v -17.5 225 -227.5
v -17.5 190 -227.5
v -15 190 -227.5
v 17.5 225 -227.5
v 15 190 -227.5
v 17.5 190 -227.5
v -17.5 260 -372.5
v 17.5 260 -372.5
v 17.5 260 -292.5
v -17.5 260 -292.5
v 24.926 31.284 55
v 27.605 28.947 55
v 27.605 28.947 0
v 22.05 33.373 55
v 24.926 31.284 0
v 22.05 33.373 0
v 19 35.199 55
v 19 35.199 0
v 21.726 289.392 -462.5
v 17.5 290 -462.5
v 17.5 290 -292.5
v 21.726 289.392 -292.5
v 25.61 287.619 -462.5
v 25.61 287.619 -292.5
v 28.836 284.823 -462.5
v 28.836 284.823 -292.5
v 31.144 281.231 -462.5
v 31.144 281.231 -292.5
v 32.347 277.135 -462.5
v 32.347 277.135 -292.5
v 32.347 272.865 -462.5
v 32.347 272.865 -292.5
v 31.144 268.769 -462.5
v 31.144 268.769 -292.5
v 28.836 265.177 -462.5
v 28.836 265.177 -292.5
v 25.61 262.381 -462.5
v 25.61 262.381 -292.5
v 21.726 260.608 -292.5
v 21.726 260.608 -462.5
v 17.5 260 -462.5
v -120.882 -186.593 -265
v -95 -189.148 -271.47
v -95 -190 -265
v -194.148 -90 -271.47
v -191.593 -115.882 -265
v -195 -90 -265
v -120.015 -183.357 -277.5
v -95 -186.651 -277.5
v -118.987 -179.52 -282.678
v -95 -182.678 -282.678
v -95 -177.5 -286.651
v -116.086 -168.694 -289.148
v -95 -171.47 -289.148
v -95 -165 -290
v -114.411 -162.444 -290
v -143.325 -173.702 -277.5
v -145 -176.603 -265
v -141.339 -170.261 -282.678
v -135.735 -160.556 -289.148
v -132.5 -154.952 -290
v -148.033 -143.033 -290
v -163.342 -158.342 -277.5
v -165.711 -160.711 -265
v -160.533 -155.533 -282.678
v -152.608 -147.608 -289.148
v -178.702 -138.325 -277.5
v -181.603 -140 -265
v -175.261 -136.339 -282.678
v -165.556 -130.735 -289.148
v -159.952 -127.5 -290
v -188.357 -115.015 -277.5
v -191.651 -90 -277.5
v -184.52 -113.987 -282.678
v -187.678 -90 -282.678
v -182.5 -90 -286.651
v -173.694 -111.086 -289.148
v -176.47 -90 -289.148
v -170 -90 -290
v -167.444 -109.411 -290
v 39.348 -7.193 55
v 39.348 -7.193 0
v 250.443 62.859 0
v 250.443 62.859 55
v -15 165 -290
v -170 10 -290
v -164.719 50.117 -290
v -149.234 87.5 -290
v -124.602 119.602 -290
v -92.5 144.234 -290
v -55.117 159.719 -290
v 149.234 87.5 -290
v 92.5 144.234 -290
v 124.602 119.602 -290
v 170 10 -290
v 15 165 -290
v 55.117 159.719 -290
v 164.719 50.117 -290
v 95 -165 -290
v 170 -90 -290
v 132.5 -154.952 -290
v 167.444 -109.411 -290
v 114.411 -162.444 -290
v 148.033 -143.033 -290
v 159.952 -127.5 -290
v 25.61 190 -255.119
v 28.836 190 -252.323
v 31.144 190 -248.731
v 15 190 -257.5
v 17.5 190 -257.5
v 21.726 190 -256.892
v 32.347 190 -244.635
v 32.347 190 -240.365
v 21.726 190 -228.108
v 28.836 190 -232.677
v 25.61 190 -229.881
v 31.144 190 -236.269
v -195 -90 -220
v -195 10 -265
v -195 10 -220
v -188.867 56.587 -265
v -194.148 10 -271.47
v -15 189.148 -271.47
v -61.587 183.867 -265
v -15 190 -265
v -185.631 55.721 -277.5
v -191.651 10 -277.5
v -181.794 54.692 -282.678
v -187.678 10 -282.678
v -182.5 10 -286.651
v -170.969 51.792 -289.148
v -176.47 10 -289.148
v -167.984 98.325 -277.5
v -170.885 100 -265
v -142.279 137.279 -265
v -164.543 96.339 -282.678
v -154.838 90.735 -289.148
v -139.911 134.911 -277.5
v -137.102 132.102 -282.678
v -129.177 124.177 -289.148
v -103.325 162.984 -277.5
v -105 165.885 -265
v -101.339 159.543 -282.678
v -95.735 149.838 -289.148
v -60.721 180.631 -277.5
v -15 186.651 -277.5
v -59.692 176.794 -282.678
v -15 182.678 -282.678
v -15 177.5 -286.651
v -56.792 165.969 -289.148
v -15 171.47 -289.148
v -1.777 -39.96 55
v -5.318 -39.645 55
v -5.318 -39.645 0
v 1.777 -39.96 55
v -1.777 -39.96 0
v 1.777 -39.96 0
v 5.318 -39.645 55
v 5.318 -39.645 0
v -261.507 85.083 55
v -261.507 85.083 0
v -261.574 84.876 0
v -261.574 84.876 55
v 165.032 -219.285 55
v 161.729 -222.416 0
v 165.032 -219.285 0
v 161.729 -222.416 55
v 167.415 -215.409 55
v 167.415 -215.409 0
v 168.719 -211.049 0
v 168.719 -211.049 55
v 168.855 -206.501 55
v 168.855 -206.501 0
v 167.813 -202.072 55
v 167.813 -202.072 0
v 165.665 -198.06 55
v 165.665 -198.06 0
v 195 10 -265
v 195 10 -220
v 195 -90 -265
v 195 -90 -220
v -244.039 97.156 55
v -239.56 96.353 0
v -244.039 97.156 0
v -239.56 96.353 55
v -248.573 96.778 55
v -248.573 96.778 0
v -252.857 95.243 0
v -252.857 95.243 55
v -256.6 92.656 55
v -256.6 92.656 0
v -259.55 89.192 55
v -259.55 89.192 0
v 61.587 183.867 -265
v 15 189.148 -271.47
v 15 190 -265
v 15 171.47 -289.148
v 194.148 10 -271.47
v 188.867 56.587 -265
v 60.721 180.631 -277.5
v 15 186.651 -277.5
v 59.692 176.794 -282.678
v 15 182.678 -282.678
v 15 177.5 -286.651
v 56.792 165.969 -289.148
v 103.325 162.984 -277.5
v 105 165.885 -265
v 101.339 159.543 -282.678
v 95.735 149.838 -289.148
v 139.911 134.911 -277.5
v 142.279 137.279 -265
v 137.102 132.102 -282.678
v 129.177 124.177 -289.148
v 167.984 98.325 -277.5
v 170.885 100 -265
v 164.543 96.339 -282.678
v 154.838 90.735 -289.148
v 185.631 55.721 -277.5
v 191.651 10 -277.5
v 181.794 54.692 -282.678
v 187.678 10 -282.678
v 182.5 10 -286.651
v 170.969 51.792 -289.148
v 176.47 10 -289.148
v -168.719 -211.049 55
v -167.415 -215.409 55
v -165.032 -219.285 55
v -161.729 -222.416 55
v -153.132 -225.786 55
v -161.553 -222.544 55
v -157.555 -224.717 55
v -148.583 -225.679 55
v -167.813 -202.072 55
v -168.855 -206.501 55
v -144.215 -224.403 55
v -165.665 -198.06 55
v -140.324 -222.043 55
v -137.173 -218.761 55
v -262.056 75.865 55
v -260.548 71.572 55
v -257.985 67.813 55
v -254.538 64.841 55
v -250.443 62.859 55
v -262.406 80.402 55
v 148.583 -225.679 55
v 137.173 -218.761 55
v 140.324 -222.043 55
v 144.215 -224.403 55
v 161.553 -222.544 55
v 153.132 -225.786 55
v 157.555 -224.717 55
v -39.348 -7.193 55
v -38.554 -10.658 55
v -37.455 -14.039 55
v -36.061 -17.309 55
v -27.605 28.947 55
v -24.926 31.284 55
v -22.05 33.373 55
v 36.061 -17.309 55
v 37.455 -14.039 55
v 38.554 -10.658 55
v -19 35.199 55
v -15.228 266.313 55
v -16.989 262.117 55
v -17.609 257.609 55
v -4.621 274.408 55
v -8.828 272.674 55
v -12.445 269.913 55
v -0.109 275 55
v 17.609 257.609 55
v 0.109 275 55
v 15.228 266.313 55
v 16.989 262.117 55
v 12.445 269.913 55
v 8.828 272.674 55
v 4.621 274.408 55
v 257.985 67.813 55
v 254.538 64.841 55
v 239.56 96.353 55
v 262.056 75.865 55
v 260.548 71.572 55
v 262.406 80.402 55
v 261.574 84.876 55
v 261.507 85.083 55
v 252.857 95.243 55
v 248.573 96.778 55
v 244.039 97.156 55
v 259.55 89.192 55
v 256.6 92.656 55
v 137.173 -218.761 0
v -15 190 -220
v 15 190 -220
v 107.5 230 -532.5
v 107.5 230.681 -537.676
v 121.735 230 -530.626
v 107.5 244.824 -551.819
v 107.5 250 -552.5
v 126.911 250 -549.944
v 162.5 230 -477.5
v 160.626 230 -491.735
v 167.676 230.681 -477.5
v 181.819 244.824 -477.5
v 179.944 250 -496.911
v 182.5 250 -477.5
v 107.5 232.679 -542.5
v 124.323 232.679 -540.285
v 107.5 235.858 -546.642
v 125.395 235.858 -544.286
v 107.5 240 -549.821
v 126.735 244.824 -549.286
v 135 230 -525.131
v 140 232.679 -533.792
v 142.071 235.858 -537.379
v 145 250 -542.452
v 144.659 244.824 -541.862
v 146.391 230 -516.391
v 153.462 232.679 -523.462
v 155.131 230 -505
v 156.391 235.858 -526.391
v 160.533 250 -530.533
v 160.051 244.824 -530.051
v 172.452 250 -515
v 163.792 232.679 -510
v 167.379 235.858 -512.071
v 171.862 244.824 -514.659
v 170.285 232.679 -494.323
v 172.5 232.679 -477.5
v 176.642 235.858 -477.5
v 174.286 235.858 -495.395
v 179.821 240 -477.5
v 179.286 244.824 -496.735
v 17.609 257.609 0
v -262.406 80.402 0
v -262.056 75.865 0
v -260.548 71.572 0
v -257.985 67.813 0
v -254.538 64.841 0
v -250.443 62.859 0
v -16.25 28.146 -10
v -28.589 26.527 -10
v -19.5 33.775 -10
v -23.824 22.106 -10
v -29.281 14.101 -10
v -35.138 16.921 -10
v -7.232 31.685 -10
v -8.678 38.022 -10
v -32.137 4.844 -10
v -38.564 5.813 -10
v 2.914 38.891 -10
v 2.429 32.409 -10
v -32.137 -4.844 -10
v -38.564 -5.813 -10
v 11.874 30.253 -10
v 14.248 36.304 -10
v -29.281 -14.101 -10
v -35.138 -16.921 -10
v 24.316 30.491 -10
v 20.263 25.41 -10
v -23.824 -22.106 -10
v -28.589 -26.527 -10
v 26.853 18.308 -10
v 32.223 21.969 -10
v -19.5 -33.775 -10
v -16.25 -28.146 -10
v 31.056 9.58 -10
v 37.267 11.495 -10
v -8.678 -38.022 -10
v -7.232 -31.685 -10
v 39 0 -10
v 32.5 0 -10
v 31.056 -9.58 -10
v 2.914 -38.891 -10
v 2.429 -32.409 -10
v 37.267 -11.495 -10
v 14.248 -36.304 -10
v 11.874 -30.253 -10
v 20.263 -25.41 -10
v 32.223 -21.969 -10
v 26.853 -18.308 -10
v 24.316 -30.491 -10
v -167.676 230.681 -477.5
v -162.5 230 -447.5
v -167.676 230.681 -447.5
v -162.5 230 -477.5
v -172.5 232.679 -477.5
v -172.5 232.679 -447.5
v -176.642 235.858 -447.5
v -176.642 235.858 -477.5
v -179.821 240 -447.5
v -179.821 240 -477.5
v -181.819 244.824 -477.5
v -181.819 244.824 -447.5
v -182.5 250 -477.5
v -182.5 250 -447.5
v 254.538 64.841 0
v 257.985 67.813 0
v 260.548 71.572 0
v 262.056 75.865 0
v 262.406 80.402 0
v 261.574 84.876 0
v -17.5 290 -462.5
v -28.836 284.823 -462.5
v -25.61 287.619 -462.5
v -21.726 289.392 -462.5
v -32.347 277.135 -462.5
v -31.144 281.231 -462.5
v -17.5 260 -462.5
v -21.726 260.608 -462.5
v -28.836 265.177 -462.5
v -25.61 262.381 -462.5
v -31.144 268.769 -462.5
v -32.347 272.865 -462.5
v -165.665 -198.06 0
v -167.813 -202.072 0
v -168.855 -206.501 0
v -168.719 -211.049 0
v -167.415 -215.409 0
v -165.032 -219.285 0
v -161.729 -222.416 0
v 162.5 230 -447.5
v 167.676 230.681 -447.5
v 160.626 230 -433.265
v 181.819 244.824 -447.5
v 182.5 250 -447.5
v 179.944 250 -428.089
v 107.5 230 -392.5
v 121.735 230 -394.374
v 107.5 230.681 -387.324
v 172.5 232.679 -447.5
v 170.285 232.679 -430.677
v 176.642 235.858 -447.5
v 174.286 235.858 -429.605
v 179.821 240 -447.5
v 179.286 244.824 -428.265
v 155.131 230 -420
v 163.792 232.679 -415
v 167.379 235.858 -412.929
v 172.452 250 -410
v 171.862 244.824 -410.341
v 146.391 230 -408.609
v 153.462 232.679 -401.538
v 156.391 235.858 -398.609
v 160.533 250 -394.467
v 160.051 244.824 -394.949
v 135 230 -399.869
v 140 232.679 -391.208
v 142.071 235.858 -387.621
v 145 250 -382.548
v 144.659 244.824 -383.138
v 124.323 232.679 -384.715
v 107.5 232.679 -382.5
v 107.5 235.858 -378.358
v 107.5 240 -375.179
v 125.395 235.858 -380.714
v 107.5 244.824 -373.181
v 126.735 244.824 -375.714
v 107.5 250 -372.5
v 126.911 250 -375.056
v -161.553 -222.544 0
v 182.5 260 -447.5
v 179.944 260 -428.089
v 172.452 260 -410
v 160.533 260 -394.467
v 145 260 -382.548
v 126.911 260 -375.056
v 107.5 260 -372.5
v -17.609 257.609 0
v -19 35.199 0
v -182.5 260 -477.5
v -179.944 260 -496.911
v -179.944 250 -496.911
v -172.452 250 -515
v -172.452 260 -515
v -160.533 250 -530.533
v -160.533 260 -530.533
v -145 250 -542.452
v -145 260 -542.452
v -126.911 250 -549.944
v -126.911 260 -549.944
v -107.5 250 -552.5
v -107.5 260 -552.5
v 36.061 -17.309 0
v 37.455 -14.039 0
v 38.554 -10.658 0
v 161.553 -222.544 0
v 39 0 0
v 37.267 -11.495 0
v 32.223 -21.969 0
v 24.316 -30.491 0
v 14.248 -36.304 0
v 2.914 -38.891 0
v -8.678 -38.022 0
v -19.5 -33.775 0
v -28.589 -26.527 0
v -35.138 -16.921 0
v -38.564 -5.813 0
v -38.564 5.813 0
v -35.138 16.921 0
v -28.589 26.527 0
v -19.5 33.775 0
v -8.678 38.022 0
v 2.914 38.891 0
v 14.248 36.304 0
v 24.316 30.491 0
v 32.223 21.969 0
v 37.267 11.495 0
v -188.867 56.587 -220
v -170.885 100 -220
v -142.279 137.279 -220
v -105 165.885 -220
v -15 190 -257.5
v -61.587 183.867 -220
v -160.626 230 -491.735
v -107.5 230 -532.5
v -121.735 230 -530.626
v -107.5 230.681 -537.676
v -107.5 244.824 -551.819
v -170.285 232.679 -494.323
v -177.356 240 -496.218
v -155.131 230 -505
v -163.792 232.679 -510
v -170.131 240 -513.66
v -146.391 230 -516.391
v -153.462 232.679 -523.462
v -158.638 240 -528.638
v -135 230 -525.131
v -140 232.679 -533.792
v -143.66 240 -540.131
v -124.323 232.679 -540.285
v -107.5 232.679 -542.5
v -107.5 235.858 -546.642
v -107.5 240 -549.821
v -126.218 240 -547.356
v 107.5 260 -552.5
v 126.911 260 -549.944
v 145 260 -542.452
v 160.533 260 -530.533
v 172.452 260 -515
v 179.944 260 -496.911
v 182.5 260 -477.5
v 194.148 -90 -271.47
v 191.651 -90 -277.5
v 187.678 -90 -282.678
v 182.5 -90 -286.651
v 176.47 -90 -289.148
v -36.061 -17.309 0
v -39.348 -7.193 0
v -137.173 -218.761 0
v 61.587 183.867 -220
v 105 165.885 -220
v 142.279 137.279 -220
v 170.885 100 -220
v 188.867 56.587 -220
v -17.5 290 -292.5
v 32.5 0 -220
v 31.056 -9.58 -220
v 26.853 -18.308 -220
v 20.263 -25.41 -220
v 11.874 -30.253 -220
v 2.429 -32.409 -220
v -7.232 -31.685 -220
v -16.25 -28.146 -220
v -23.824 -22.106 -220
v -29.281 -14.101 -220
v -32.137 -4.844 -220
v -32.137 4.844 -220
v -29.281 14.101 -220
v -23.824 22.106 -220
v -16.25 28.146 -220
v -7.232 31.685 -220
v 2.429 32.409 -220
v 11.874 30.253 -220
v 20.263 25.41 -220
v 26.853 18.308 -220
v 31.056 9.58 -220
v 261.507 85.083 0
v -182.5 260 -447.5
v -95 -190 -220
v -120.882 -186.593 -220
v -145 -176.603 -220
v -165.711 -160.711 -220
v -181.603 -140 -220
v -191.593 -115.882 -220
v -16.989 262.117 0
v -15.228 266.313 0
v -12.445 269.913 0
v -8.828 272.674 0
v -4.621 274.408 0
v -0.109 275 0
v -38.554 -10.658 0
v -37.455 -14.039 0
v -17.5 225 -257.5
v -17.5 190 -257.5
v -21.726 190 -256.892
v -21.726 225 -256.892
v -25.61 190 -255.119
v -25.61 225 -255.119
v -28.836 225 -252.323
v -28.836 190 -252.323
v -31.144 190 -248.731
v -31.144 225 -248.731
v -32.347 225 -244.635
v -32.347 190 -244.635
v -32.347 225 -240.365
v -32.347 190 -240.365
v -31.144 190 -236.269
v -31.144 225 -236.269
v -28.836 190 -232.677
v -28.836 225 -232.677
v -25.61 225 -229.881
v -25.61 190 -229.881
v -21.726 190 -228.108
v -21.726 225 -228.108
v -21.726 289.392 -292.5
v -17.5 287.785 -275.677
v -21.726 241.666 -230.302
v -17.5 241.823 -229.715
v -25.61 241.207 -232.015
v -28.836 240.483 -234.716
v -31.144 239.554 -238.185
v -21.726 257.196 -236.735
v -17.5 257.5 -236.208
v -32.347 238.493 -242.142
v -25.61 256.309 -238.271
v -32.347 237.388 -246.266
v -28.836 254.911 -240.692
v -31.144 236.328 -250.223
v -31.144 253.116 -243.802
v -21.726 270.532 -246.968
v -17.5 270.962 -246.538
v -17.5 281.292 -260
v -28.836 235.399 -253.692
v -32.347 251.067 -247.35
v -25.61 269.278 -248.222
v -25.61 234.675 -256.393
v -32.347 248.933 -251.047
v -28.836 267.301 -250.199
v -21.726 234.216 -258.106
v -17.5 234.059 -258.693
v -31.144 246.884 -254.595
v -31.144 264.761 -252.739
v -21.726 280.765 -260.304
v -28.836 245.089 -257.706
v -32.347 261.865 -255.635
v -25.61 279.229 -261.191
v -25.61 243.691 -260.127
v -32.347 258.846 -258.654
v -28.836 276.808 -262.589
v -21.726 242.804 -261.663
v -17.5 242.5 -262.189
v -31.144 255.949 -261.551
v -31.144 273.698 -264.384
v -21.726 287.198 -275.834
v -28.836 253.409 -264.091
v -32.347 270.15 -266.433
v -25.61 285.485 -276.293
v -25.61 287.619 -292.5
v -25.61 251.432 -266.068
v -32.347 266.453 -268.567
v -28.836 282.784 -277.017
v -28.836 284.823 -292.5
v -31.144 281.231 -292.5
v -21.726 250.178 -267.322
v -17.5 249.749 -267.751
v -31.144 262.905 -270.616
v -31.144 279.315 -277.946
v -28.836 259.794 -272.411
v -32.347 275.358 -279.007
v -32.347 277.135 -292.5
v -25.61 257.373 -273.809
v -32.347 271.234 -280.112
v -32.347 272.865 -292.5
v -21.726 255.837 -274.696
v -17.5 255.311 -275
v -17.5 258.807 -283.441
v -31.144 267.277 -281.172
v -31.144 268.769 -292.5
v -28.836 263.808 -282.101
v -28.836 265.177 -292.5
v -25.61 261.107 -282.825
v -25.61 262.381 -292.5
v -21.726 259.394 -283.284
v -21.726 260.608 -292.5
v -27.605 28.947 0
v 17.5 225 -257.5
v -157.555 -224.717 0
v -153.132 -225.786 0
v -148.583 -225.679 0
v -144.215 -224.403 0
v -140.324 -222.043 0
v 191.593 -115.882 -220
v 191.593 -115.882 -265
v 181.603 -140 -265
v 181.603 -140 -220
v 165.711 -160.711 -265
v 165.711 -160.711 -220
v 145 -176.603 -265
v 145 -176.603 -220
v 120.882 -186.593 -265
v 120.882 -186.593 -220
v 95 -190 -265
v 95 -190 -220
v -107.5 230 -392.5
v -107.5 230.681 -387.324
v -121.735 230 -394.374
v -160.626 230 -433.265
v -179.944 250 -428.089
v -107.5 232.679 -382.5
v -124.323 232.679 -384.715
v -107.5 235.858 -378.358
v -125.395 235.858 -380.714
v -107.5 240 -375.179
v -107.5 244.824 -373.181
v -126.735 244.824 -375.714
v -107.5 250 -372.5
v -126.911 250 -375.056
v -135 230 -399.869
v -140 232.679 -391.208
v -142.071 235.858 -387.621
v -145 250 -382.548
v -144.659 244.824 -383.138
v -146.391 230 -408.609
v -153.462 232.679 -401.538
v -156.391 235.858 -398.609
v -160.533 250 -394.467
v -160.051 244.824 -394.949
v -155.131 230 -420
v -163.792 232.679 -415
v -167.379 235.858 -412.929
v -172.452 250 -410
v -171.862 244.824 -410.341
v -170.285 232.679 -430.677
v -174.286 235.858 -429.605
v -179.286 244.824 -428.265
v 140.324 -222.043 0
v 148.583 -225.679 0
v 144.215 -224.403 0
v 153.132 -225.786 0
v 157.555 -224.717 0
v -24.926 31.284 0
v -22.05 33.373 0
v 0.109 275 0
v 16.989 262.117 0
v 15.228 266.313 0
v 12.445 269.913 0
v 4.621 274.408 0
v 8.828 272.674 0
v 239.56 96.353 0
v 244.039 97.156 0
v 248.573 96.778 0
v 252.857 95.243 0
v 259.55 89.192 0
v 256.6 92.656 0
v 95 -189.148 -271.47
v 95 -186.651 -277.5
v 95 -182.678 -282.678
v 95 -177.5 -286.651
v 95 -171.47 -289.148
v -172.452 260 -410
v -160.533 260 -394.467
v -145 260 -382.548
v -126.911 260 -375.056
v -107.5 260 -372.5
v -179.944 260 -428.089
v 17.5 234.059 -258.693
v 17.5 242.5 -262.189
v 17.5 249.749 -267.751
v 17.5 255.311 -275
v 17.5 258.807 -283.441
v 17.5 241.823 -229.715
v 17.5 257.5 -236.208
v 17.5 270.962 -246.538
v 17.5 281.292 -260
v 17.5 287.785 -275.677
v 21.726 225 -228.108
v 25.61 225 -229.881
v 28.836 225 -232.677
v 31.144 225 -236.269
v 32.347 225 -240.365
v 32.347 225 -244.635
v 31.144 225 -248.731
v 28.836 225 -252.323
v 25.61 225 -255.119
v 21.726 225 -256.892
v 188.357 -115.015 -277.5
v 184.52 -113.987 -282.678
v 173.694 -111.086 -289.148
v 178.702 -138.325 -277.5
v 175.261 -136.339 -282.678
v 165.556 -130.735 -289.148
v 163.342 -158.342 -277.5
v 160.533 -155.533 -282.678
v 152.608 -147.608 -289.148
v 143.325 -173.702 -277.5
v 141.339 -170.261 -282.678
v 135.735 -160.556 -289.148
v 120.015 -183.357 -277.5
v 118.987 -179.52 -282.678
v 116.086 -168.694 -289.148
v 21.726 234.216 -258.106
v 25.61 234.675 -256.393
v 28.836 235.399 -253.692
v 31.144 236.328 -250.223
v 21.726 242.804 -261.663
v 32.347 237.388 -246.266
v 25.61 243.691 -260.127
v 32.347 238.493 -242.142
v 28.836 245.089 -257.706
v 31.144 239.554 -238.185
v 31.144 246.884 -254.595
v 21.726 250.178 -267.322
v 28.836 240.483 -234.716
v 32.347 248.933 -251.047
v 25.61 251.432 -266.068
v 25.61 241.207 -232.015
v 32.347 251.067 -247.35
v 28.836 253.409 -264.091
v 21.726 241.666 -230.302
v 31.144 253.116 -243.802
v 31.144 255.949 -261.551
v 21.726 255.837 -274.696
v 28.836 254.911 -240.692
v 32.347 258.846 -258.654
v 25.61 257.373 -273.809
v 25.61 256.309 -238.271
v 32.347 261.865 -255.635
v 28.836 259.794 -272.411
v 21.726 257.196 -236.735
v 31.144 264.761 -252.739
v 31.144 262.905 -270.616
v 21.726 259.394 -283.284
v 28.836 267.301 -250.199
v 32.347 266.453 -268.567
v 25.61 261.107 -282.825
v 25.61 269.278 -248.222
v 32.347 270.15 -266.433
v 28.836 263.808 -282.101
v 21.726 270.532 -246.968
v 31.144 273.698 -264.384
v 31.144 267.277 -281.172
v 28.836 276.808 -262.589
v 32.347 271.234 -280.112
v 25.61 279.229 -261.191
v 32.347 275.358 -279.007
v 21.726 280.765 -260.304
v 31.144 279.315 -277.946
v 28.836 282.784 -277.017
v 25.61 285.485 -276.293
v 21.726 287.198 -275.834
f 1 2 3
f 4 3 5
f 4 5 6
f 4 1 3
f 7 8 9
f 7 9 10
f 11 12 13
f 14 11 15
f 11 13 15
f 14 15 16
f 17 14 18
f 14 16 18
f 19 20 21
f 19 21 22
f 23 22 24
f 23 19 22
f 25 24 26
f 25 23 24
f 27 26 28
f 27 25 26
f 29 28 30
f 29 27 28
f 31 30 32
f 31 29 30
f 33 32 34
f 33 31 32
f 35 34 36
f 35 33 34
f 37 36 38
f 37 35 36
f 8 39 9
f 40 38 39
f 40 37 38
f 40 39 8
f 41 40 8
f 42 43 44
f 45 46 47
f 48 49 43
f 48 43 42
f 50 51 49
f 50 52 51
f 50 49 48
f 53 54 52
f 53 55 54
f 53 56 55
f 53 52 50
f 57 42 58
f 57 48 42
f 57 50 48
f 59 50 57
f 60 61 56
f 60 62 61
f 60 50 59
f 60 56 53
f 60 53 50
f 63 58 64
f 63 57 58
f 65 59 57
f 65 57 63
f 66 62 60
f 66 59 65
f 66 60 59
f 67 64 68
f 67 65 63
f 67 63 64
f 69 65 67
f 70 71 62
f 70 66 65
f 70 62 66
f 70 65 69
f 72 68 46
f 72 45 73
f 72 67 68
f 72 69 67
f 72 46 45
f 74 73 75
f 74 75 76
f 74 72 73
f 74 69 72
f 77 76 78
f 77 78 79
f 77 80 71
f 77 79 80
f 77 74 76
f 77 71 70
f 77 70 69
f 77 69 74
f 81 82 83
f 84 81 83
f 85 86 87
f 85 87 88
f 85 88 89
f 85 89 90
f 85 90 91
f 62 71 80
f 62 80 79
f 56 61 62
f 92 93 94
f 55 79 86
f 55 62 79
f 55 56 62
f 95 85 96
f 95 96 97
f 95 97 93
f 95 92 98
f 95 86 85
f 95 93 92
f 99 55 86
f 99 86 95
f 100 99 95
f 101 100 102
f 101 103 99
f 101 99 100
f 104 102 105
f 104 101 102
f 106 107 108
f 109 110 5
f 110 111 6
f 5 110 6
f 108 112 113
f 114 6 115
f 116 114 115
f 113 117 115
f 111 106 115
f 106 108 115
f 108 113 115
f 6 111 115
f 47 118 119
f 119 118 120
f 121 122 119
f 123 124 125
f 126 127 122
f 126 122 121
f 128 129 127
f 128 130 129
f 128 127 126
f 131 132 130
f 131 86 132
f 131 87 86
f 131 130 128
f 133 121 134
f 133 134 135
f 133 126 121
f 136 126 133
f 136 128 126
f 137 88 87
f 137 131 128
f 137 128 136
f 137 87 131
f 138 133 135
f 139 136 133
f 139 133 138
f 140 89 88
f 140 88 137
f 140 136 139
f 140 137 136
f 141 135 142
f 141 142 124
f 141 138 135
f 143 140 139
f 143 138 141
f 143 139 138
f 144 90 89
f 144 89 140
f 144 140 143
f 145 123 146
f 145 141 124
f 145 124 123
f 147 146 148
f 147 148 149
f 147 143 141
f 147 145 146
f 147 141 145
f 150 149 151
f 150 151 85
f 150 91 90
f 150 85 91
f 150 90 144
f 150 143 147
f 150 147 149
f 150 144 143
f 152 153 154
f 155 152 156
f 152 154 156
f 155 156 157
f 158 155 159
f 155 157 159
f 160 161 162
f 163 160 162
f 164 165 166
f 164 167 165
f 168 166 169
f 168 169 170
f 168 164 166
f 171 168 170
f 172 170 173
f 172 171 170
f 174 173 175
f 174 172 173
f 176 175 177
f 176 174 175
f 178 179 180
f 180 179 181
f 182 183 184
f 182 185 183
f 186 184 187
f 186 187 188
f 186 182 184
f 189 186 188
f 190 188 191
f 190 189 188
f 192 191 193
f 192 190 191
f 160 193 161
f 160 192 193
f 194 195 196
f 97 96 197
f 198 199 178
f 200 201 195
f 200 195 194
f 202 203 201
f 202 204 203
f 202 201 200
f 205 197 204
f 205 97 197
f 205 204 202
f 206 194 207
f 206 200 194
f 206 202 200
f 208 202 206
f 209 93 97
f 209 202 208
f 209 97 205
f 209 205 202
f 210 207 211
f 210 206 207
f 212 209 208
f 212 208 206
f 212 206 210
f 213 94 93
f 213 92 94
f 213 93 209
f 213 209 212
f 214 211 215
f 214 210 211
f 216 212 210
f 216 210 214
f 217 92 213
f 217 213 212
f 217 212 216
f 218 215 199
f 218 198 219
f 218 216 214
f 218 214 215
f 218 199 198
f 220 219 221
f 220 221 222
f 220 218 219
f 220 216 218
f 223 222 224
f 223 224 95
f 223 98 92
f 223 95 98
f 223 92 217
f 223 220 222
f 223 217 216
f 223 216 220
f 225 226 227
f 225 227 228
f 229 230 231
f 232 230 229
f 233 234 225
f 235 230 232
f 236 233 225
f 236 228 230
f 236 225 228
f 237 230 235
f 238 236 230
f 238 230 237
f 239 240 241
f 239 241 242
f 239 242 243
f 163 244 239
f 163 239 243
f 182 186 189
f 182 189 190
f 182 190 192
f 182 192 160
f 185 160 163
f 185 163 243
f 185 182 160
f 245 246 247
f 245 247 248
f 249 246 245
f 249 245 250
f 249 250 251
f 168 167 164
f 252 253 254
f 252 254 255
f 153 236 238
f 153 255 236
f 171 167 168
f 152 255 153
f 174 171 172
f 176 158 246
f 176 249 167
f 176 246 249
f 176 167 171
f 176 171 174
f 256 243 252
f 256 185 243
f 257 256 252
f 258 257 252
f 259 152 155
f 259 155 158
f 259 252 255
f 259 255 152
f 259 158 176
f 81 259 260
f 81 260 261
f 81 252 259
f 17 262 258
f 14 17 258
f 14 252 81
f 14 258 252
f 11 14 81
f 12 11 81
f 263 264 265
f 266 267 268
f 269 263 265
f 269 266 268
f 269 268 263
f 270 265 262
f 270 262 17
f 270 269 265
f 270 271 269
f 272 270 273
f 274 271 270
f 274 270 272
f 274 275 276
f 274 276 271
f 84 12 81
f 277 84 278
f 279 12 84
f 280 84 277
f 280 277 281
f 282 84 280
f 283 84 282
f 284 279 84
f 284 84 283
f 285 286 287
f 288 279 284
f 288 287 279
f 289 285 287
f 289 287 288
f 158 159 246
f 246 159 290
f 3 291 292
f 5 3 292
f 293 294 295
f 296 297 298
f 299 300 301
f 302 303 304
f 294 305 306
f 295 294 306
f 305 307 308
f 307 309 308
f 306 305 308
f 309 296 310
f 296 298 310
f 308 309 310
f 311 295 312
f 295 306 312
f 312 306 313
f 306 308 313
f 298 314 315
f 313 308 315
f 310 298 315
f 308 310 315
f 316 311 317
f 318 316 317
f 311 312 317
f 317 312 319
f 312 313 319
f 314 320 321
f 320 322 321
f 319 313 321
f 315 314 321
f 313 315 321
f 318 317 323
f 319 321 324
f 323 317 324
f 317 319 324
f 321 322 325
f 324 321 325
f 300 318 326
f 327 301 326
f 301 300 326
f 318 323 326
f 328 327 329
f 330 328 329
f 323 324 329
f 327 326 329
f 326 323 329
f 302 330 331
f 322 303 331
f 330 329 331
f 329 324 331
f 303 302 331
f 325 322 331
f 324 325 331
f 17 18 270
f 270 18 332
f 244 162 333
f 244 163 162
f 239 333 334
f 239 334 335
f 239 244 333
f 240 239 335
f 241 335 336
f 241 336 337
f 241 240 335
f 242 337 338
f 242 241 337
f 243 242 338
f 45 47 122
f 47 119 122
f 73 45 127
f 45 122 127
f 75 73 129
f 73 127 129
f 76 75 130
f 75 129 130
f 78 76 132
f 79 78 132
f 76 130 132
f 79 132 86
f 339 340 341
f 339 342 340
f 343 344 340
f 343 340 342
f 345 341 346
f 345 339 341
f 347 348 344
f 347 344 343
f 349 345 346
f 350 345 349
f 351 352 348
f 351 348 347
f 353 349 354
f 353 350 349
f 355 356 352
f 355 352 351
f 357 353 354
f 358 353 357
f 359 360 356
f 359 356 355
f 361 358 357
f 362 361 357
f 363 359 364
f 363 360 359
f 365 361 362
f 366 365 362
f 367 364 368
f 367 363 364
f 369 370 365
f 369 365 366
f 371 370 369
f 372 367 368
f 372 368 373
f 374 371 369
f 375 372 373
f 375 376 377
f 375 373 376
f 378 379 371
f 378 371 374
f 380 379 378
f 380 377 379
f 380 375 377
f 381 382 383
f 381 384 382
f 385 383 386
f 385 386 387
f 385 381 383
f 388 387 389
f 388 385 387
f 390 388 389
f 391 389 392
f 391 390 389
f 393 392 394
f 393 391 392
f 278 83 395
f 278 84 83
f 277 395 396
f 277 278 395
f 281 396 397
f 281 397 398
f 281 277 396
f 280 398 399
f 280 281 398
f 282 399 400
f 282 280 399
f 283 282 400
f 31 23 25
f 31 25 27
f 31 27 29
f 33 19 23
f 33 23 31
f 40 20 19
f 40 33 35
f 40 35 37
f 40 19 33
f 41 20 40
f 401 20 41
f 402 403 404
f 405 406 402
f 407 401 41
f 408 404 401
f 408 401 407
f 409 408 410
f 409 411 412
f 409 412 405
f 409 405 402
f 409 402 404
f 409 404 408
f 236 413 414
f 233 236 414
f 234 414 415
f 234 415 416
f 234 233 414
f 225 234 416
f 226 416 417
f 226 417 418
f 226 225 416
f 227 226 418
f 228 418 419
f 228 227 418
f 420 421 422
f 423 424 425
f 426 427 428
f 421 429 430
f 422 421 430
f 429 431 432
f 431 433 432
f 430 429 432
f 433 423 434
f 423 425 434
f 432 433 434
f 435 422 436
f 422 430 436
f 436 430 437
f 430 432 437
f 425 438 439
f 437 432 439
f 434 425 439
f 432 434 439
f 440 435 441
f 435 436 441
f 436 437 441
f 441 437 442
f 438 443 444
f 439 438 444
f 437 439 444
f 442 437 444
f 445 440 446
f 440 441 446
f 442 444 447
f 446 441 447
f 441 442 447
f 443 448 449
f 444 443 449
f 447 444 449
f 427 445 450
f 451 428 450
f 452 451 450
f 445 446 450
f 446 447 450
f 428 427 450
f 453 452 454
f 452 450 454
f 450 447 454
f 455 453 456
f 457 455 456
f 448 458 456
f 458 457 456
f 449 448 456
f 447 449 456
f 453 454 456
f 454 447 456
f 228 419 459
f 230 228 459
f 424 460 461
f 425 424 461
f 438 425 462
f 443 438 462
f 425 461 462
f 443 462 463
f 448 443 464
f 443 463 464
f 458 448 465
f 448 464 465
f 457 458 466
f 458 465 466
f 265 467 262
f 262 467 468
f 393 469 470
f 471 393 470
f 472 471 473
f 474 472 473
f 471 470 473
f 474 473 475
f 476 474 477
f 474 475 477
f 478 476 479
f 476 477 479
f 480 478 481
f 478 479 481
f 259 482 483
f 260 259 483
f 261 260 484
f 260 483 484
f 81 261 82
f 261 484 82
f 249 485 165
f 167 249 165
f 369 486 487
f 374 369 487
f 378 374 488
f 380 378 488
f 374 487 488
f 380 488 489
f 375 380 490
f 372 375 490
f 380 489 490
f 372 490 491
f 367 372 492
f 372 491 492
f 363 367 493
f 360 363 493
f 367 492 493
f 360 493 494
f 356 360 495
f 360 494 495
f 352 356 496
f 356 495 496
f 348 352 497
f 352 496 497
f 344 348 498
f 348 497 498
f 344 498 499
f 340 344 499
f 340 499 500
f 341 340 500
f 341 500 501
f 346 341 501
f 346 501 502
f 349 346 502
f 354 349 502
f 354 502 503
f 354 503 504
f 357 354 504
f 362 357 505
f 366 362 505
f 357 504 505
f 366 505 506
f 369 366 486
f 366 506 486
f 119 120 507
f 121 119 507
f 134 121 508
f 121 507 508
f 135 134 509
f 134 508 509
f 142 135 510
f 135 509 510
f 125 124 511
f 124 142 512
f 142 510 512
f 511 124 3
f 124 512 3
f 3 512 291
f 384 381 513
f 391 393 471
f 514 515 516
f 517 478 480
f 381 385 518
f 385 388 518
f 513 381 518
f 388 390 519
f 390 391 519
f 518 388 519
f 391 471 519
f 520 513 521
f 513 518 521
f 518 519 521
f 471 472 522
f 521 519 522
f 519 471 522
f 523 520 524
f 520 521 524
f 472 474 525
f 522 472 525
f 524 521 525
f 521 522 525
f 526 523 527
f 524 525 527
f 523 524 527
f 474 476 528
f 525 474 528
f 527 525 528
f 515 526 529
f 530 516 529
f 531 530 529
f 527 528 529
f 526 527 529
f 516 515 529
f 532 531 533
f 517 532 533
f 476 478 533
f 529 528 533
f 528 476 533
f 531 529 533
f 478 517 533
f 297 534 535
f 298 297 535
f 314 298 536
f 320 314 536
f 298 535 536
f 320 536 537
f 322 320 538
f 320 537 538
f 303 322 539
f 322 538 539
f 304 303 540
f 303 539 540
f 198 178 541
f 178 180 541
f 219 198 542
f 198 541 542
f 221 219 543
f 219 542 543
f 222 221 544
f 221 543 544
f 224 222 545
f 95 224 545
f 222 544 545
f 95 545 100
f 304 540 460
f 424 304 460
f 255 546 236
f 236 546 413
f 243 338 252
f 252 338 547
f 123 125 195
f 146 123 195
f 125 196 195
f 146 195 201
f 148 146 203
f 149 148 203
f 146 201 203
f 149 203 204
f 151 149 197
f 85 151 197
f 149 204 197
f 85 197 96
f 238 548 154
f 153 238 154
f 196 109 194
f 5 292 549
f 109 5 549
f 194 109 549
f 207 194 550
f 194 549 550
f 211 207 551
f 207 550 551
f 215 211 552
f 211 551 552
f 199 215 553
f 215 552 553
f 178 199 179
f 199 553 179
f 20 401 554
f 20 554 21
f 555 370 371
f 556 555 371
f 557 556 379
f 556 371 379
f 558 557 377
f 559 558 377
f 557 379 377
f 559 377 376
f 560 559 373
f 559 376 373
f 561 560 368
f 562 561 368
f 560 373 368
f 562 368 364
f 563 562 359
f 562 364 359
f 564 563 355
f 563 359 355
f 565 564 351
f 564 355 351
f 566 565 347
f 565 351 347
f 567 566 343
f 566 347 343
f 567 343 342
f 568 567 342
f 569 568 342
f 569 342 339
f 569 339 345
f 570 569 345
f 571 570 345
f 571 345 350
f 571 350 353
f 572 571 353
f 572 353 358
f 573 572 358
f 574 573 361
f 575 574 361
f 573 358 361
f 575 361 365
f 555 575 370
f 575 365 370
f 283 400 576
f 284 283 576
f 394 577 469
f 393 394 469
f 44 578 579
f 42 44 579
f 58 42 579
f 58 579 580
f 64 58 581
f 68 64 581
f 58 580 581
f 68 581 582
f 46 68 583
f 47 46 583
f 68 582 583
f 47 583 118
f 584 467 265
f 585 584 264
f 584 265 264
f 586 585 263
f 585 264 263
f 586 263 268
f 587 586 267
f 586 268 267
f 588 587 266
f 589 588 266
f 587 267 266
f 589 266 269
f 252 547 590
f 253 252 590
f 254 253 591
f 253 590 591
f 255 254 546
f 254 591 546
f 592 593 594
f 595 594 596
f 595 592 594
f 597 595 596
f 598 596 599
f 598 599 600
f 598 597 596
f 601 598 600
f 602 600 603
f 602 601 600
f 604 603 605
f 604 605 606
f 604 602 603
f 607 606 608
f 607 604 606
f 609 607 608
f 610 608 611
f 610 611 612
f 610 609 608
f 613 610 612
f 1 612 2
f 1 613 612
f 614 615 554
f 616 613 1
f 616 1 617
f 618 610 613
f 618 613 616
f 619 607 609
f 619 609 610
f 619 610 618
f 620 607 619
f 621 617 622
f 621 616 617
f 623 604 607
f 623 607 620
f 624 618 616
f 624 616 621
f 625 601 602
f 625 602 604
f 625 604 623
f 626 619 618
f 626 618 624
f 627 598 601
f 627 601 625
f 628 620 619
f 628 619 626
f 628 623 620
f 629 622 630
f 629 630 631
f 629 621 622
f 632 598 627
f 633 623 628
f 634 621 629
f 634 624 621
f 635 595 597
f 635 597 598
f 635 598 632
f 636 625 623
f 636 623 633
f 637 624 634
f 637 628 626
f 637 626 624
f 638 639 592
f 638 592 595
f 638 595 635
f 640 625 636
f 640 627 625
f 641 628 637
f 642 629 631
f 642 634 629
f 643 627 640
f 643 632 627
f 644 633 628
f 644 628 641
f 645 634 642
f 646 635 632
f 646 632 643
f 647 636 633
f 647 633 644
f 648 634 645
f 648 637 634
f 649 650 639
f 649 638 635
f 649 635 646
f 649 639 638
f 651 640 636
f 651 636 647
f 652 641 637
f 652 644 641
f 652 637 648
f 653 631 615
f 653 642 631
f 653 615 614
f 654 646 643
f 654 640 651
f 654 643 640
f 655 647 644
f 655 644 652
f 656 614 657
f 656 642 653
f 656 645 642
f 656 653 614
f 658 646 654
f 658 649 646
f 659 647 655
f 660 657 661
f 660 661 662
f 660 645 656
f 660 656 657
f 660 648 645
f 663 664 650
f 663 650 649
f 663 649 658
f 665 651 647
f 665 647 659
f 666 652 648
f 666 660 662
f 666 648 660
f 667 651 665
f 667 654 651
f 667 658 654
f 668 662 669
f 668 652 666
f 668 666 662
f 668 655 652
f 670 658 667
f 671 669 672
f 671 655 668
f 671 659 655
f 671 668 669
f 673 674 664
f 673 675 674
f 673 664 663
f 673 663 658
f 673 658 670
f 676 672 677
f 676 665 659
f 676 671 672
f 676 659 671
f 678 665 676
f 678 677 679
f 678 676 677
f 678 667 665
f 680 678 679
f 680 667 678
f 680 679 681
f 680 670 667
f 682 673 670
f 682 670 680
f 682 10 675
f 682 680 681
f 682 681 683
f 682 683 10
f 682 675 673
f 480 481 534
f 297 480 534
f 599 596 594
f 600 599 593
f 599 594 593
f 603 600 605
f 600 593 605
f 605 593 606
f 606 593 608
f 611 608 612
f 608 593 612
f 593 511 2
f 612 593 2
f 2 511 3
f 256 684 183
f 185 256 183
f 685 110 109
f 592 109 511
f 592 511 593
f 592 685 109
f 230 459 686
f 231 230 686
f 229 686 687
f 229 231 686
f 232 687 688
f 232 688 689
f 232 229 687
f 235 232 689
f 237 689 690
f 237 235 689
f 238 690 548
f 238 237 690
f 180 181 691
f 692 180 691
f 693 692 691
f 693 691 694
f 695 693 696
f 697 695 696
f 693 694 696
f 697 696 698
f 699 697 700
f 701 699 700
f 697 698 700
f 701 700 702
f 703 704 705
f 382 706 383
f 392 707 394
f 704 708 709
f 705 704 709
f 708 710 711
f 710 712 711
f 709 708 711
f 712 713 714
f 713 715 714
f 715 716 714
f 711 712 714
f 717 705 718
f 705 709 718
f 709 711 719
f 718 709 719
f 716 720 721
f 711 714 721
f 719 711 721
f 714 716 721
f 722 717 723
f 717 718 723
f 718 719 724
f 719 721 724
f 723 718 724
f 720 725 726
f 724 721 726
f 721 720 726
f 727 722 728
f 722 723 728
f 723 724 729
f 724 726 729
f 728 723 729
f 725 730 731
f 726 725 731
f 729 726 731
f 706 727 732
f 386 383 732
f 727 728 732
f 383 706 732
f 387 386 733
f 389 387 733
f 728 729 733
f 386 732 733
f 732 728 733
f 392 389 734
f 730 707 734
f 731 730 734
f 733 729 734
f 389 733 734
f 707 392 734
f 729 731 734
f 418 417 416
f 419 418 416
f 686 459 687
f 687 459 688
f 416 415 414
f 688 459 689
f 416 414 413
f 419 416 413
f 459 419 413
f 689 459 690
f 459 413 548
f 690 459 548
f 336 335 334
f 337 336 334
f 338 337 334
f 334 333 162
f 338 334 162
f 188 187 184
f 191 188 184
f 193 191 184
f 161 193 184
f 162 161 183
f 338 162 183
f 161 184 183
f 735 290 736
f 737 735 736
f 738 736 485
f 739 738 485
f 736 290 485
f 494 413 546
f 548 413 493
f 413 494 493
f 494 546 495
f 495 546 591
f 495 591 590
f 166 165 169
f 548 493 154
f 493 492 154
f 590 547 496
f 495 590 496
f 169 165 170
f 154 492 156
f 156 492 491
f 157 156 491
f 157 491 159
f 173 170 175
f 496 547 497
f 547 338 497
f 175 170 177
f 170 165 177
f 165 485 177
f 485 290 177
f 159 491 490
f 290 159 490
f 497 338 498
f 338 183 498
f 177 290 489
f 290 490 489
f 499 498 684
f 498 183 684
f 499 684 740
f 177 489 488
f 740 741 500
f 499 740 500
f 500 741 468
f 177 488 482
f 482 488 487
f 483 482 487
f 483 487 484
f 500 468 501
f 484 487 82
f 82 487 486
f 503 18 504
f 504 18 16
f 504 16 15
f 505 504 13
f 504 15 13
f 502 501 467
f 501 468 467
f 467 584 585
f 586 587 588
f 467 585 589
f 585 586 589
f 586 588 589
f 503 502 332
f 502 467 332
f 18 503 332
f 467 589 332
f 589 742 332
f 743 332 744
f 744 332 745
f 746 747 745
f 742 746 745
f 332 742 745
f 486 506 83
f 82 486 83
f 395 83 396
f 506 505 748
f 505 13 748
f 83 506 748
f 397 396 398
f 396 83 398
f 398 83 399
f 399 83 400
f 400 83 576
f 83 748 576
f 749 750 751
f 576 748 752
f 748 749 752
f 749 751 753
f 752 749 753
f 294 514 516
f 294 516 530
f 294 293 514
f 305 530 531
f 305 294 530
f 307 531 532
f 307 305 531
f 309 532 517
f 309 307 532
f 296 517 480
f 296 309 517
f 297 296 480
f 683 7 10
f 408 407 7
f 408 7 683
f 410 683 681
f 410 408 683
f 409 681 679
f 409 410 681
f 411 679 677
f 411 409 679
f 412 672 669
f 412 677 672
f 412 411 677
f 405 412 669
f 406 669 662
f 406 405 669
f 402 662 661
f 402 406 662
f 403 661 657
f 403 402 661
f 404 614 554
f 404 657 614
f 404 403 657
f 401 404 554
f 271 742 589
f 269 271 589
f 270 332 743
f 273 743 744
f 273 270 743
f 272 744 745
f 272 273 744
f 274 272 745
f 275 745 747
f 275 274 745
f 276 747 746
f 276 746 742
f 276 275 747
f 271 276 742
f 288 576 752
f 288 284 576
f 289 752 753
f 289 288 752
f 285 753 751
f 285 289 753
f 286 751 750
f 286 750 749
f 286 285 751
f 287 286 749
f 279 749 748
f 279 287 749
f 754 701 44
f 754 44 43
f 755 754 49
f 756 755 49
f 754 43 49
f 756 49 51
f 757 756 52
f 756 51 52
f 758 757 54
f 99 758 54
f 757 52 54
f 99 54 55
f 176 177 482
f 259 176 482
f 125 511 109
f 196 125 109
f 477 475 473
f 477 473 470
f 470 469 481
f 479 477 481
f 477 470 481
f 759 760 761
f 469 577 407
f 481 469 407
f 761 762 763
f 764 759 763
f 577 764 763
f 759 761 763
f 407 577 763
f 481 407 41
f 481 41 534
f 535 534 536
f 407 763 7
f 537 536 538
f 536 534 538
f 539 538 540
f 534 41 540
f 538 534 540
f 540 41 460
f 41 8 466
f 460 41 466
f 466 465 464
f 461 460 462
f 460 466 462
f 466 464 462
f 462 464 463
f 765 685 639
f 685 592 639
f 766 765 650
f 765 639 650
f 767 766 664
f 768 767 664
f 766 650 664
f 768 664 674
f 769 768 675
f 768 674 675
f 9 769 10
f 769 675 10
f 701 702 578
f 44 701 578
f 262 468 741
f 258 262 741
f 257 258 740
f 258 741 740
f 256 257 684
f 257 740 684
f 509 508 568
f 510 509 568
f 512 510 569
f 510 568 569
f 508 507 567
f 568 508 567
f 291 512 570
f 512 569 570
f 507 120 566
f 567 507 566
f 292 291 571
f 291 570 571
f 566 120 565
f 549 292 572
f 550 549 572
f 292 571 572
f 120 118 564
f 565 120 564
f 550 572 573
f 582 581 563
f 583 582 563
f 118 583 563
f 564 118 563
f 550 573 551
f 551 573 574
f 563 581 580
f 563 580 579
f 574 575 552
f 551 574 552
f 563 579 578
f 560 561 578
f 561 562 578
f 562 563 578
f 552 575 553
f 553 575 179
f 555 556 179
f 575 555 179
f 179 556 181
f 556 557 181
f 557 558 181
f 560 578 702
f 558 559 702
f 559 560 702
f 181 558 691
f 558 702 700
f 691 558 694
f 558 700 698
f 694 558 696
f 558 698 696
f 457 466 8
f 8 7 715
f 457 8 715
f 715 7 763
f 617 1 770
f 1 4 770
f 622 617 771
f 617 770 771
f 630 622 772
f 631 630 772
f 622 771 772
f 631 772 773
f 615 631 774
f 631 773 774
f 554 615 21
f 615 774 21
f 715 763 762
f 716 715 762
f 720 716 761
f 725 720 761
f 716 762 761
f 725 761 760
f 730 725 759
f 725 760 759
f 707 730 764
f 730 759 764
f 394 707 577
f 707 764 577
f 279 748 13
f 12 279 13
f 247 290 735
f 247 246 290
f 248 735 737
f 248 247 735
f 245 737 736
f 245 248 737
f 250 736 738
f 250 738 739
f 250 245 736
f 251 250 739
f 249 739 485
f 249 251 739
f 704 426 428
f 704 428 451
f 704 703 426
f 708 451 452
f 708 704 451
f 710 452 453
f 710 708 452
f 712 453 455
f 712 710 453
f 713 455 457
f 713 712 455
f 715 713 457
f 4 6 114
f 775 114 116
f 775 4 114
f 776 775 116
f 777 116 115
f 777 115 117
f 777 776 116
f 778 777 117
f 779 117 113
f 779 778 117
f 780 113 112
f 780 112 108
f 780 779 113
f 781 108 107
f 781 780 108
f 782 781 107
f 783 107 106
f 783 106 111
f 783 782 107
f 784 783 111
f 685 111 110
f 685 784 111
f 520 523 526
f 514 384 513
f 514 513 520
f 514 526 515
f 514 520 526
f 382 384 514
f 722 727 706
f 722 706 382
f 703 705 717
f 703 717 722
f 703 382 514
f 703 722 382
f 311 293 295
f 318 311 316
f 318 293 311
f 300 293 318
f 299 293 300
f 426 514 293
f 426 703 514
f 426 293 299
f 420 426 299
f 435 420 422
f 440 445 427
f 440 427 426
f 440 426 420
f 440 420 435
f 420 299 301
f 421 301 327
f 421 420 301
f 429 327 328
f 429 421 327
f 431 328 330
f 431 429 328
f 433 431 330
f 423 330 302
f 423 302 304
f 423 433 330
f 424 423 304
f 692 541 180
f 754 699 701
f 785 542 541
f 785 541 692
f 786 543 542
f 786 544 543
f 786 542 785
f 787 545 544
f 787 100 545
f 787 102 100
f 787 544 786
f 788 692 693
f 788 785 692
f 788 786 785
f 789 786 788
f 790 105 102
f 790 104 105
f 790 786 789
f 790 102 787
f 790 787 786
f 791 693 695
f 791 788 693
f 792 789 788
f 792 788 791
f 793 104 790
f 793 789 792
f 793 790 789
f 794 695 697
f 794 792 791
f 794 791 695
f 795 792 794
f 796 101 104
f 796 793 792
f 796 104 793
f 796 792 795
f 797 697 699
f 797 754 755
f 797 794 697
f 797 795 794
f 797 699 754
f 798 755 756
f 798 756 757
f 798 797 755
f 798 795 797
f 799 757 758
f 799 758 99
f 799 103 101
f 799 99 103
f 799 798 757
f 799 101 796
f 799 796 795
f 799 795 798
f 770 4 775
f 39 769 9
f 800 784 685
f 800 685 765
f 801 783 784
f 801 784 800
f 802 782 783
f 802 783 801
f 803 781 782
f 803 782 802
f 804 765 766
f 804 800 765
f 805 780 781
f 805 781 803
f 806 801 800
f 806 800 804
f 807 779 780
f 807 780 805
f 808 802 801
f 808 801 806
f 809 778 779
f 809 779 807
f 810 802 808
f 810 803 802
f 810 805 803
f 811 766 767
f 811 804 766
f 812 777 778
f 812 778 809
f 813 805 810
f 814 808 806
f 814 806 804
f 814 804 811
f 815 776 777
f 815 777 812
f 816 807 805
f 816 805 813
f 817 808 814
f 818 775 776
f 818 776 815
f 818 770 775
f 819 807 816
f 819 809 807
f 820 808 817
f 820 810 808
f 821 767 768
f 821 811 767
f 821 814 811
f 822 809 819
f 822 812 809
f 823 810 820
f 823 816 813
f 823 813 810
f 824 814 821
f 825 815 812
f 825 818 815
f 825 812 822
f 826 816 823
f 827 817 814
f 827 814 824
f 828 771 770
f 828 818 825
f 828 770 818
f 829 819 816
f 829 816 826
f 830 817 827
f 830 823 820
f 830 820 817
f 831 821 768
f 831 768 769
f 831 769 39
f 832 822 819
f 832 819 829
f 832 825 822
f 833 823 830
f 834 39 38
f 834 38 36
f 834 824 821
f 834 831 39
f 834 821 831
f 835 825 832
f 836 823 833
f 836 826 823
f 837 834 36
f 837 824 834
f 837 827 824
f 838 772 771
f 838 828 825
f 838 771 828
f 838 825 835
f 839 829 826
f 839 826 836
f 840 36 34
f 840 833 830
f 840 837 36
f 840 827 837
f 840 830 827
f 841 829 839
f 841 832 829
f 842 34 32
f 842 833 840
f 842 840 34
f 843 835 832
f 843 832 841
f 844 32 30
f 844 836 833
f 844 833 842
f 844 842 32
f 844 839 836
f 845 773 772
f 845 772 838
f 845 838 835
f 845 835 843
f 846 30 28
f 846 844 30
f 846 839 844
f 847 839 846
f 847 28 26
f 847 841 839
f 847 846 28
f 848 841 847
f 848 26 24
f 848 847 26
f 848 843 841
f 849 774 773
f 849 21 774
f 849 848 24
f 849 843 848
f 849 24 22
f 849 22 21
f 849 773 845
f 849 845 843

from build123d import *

# Parameters (mm, degrees)
F1_DEPTH  = 55
F2_R      = 17.5
F3_R      = 39
F4_DEPTH  = 10
F5_R      = 32.5
F6_DEPTH  = 210
F8_DEPTH  = 45
F10_DEPTH = 25
F11_R     = 25
F16_DEPTH = 30
F17_R     = 20


with BuildPart() as f1:
    # F0 (on Top) → F1 (new body)
    with BuildSketch(Plane.XY):
        with BuildLine():
            Line((-17.5, 275), (-19, 35.1994318136))
            ThreePointArc((-19, 35.1994318136), (-23.5114100917, 32.360679775), (-27.6053261031, 28.9472964324))
            Line((-27.6053261031, 28.9472964324), (-256.1327445796, 101.6231624883))
            Line((-256.1327445796, 101.6231624883), (-266.9483393827, 68.3361844179))
            Line((-266.9483393827, 68.3361844179), (-39.3479718893, -7.1928511869))
            ThreePointArc((-39.3479718893, -7.1928511869), (-38.0422606518, -12.360679775), (-36.0610298022, -17.309018736))
            Line((-36.0610298022, -17.309018736), (-175.798741782, -212.193431538))
            Line((-175.798741782, -212.193431538), (-147.4831469789, -232.7659153682))
            Line((-147.4831469789, -232.7659153682), (-5.318384016, -39.6448583231))
            ThreePointArc((-5.318384016, -39.6448583231), (0, -40), (5.318384016, -39.6448583231))
            Line((5.318384016, -39.6448583231), (147.4831469789, -232.7659153682))
            Line((147.4831469789, -232.7659153682), (175.798741782, -212.193431538))
            Line((175.798741782, -212.193431538), (36.0610298022, -17.309018736))
            ThreePointArc((36.0610298022, -17.309018736), (38.0422606518, -12.360679775), (39.3479718893, -7.1928511869))
            Line((39.3479718893, -7.1928511869), (266.9483393827, 68.3361844179))
            Line((266.9483393827, 68.3361844179), (256.1327445796, 101.6231624883))
            Line((256.1327445796, 101.6231624883), (27.6053261031, 28.9472964324))
            ThreePointArc((27.6053261031, 28.9472964324), (23.5114100917, 32.360679775), (19, 35.1994318136))
            Line((19, 35.1994318136), (17.5, 275))
            Line((17.5, 275), (-17.5, 275))
        make_face()
    extrude(amount=F1_DEPTH)

    # F2
    f2_edges = [f1.edges().sort_by_distance(p)[0] for p in [
        (17.5, 275, 27.5),
        (256.132745, 101.623162, 27.5),
        (266.948339, 68.336184, 27.5),
        (-17.5, 275, 27.5),
        (-256.132745, 101.623162, 27.5),
        (-266.948339, 68.336184, 27.5),
        (-175.798742, -212.193432, 27.5),
        (-147.483147, -232.765915, 27.5),
        (147.483147, -232.765915, 27.5),
        (175.798742, -212.193432, 27.5),
    ]]
    fillet(f2_edges, radius=F2_R)

    # F3 (on face) → F4 (join)
    with BuildSketch(Plane(origin=(0, 0, 0), x_dir=(1, 0, 0), z_dir=(0, 0, -1))):
        Circle(F3_R)
    extrude(amount=F4_DEPTH)

    # F5 (on face) → F6 (join)
    with BuildSketch(Plane(origin=(0, 0, -10), x_dir=(1, 0, 0), z_dir=(0, 0, -1))):
        Circle(F5_R)
    extrude(amount=F6_DEPTH)

    # F7 (on face) → F8 (join)
    with BuildSketch(Plane(origin=(0, 0, -220), x_dir=(1, 0, 0), z_dir=(0, 0, -1))):
        with BuildLine():
            Line((95, 190), (-95, 190))
            ThreePointArc((-95, 190), (-165.7106781187, 160.7106781187), (-195, 90))
            Line((-195, 90), (-195, -10))
            ThreePointArc((-195, -10), (-142.2792206136, -137.2792206136), (-15, -190))
            Line((-15, -190), (15, -190))
            ThreePointArc((15, -190), (142.2792206136, -137.2792206136), (195, -10))
            Line((195, -10), (195, 90))
            ThreePointArc((195, 90), (165.7106781187, 160.7106781187), (95, 190))
        make_face()
    extrude(amount=F8_DEPTH)

    # F9 (on face) → F10 (join)
    with BuildSketch(Plane(origin=(0, 0, -265), x_dir=(1, 0, 0), z_dir=(0, 0, -1))):
        with BuildLine():
            Line((95, 190), (-95, 190))
            ThreePointArc((-95, 190), (-165.7106781187, 160.7106781187), (-195, 90))
            Line((-195, 90), (-195, -10))
            ThreePointArc((-195, -10), (-142.2792206136, -137.2792206136), (-15, -190))
            Line((-15, -190), (15, -190))
            ThreePointArc((15, -190), (142.2792206136, -137.2792206136), (195, -10))
            Line((195, -10), (195, 90))
            ThreePointArc((195, 90), (165.7106781187, 160.7106781187), (95, 190))
        make_face()
    extrude(amount=F10_DEPTH)

    # F11
    f11_edges = [f1.edges().sort_by_distance(p)[0] for p in [
        (195, -40, -290),
    ]]
    fillet(f11_edges, radius=F11_R)

    # F14: sweep along a path in F13
    with BuildLine(Plane.YZ) as f14_path:
        Line((190, -242.5), (225, -242.5))
        ThreePointArc((225, -242.5), (260.3553390593, -257.1446609407), (275, -292.5))
        Line((275, -292.5), (275, -462.5))
    # F12 (on face) → F14 (sweep)
    with BuildSketch(Plane(origin=(0, 190, 0), x_dir=(-1, 0, 0), z_dir=(0, 1, 0))):
        with BuildLine():
            Line((17.5, -227.5), (-17.5, -227.5))
            ThreePointArc((-17.5, -227.5), (-28.1066017178, -231.8933982822), (-32.5, -242.5))
            ThreePointArc((-32.5, -242.5), (-28.1066017178, -253.1066017178), (-17.5, -257.5))
            Line((-17.5, -257.5), (17.5, -257.5))
            ThreePointArc((17.5, -257.5), (28.1066017178, -253.1066017178), (32.5, -242.5))
            ThreePointArc((32.5, -242.5), (28.1066017178, -231.8933982822), (17.5, -227.5))
        make_face()
    sweep(path=f14_path.line)

    # F15 (on face) → F16 (join)
    with BuildSketch(Plane.XZ.offset(-260)):
        with BuildLine():
            Line((107.5, -372.5), (-107.5, -372.5))
            ThreePointArc((-107.5, -372.5), (-160.533008589, -394.466991411), (-182.5, -447.5))
            Line((-182.5, -447.5), (-182.5, -477.5))
            ThreePointArc((-182.5, -477.5), (-160.533008589, -530.533008589), (-107.5, -552.5))
            Line((-107.5, -552.5), (107.5, -552.5))
            ThreePointArc((107.5, -552.5), (160.533008589, -530.533008589), (182.5, -477.5))
            Line((182.5, -477.5), (182.5, -447.5))
            ThreePointArc((182.5, -447.5), (160.533008589, -394.466991411), (107.5, -372.5))
        make_face()
    extrude(amount=F16_DEPTH)

    # F17
    f17_edges = [f1.edges().sort_by_distance(p)[0] for p in [
        (-160.533009, 230, -530.533009),
    ]]
    fillet(f17_edges, radius=F17_R)


solid = f1.part
